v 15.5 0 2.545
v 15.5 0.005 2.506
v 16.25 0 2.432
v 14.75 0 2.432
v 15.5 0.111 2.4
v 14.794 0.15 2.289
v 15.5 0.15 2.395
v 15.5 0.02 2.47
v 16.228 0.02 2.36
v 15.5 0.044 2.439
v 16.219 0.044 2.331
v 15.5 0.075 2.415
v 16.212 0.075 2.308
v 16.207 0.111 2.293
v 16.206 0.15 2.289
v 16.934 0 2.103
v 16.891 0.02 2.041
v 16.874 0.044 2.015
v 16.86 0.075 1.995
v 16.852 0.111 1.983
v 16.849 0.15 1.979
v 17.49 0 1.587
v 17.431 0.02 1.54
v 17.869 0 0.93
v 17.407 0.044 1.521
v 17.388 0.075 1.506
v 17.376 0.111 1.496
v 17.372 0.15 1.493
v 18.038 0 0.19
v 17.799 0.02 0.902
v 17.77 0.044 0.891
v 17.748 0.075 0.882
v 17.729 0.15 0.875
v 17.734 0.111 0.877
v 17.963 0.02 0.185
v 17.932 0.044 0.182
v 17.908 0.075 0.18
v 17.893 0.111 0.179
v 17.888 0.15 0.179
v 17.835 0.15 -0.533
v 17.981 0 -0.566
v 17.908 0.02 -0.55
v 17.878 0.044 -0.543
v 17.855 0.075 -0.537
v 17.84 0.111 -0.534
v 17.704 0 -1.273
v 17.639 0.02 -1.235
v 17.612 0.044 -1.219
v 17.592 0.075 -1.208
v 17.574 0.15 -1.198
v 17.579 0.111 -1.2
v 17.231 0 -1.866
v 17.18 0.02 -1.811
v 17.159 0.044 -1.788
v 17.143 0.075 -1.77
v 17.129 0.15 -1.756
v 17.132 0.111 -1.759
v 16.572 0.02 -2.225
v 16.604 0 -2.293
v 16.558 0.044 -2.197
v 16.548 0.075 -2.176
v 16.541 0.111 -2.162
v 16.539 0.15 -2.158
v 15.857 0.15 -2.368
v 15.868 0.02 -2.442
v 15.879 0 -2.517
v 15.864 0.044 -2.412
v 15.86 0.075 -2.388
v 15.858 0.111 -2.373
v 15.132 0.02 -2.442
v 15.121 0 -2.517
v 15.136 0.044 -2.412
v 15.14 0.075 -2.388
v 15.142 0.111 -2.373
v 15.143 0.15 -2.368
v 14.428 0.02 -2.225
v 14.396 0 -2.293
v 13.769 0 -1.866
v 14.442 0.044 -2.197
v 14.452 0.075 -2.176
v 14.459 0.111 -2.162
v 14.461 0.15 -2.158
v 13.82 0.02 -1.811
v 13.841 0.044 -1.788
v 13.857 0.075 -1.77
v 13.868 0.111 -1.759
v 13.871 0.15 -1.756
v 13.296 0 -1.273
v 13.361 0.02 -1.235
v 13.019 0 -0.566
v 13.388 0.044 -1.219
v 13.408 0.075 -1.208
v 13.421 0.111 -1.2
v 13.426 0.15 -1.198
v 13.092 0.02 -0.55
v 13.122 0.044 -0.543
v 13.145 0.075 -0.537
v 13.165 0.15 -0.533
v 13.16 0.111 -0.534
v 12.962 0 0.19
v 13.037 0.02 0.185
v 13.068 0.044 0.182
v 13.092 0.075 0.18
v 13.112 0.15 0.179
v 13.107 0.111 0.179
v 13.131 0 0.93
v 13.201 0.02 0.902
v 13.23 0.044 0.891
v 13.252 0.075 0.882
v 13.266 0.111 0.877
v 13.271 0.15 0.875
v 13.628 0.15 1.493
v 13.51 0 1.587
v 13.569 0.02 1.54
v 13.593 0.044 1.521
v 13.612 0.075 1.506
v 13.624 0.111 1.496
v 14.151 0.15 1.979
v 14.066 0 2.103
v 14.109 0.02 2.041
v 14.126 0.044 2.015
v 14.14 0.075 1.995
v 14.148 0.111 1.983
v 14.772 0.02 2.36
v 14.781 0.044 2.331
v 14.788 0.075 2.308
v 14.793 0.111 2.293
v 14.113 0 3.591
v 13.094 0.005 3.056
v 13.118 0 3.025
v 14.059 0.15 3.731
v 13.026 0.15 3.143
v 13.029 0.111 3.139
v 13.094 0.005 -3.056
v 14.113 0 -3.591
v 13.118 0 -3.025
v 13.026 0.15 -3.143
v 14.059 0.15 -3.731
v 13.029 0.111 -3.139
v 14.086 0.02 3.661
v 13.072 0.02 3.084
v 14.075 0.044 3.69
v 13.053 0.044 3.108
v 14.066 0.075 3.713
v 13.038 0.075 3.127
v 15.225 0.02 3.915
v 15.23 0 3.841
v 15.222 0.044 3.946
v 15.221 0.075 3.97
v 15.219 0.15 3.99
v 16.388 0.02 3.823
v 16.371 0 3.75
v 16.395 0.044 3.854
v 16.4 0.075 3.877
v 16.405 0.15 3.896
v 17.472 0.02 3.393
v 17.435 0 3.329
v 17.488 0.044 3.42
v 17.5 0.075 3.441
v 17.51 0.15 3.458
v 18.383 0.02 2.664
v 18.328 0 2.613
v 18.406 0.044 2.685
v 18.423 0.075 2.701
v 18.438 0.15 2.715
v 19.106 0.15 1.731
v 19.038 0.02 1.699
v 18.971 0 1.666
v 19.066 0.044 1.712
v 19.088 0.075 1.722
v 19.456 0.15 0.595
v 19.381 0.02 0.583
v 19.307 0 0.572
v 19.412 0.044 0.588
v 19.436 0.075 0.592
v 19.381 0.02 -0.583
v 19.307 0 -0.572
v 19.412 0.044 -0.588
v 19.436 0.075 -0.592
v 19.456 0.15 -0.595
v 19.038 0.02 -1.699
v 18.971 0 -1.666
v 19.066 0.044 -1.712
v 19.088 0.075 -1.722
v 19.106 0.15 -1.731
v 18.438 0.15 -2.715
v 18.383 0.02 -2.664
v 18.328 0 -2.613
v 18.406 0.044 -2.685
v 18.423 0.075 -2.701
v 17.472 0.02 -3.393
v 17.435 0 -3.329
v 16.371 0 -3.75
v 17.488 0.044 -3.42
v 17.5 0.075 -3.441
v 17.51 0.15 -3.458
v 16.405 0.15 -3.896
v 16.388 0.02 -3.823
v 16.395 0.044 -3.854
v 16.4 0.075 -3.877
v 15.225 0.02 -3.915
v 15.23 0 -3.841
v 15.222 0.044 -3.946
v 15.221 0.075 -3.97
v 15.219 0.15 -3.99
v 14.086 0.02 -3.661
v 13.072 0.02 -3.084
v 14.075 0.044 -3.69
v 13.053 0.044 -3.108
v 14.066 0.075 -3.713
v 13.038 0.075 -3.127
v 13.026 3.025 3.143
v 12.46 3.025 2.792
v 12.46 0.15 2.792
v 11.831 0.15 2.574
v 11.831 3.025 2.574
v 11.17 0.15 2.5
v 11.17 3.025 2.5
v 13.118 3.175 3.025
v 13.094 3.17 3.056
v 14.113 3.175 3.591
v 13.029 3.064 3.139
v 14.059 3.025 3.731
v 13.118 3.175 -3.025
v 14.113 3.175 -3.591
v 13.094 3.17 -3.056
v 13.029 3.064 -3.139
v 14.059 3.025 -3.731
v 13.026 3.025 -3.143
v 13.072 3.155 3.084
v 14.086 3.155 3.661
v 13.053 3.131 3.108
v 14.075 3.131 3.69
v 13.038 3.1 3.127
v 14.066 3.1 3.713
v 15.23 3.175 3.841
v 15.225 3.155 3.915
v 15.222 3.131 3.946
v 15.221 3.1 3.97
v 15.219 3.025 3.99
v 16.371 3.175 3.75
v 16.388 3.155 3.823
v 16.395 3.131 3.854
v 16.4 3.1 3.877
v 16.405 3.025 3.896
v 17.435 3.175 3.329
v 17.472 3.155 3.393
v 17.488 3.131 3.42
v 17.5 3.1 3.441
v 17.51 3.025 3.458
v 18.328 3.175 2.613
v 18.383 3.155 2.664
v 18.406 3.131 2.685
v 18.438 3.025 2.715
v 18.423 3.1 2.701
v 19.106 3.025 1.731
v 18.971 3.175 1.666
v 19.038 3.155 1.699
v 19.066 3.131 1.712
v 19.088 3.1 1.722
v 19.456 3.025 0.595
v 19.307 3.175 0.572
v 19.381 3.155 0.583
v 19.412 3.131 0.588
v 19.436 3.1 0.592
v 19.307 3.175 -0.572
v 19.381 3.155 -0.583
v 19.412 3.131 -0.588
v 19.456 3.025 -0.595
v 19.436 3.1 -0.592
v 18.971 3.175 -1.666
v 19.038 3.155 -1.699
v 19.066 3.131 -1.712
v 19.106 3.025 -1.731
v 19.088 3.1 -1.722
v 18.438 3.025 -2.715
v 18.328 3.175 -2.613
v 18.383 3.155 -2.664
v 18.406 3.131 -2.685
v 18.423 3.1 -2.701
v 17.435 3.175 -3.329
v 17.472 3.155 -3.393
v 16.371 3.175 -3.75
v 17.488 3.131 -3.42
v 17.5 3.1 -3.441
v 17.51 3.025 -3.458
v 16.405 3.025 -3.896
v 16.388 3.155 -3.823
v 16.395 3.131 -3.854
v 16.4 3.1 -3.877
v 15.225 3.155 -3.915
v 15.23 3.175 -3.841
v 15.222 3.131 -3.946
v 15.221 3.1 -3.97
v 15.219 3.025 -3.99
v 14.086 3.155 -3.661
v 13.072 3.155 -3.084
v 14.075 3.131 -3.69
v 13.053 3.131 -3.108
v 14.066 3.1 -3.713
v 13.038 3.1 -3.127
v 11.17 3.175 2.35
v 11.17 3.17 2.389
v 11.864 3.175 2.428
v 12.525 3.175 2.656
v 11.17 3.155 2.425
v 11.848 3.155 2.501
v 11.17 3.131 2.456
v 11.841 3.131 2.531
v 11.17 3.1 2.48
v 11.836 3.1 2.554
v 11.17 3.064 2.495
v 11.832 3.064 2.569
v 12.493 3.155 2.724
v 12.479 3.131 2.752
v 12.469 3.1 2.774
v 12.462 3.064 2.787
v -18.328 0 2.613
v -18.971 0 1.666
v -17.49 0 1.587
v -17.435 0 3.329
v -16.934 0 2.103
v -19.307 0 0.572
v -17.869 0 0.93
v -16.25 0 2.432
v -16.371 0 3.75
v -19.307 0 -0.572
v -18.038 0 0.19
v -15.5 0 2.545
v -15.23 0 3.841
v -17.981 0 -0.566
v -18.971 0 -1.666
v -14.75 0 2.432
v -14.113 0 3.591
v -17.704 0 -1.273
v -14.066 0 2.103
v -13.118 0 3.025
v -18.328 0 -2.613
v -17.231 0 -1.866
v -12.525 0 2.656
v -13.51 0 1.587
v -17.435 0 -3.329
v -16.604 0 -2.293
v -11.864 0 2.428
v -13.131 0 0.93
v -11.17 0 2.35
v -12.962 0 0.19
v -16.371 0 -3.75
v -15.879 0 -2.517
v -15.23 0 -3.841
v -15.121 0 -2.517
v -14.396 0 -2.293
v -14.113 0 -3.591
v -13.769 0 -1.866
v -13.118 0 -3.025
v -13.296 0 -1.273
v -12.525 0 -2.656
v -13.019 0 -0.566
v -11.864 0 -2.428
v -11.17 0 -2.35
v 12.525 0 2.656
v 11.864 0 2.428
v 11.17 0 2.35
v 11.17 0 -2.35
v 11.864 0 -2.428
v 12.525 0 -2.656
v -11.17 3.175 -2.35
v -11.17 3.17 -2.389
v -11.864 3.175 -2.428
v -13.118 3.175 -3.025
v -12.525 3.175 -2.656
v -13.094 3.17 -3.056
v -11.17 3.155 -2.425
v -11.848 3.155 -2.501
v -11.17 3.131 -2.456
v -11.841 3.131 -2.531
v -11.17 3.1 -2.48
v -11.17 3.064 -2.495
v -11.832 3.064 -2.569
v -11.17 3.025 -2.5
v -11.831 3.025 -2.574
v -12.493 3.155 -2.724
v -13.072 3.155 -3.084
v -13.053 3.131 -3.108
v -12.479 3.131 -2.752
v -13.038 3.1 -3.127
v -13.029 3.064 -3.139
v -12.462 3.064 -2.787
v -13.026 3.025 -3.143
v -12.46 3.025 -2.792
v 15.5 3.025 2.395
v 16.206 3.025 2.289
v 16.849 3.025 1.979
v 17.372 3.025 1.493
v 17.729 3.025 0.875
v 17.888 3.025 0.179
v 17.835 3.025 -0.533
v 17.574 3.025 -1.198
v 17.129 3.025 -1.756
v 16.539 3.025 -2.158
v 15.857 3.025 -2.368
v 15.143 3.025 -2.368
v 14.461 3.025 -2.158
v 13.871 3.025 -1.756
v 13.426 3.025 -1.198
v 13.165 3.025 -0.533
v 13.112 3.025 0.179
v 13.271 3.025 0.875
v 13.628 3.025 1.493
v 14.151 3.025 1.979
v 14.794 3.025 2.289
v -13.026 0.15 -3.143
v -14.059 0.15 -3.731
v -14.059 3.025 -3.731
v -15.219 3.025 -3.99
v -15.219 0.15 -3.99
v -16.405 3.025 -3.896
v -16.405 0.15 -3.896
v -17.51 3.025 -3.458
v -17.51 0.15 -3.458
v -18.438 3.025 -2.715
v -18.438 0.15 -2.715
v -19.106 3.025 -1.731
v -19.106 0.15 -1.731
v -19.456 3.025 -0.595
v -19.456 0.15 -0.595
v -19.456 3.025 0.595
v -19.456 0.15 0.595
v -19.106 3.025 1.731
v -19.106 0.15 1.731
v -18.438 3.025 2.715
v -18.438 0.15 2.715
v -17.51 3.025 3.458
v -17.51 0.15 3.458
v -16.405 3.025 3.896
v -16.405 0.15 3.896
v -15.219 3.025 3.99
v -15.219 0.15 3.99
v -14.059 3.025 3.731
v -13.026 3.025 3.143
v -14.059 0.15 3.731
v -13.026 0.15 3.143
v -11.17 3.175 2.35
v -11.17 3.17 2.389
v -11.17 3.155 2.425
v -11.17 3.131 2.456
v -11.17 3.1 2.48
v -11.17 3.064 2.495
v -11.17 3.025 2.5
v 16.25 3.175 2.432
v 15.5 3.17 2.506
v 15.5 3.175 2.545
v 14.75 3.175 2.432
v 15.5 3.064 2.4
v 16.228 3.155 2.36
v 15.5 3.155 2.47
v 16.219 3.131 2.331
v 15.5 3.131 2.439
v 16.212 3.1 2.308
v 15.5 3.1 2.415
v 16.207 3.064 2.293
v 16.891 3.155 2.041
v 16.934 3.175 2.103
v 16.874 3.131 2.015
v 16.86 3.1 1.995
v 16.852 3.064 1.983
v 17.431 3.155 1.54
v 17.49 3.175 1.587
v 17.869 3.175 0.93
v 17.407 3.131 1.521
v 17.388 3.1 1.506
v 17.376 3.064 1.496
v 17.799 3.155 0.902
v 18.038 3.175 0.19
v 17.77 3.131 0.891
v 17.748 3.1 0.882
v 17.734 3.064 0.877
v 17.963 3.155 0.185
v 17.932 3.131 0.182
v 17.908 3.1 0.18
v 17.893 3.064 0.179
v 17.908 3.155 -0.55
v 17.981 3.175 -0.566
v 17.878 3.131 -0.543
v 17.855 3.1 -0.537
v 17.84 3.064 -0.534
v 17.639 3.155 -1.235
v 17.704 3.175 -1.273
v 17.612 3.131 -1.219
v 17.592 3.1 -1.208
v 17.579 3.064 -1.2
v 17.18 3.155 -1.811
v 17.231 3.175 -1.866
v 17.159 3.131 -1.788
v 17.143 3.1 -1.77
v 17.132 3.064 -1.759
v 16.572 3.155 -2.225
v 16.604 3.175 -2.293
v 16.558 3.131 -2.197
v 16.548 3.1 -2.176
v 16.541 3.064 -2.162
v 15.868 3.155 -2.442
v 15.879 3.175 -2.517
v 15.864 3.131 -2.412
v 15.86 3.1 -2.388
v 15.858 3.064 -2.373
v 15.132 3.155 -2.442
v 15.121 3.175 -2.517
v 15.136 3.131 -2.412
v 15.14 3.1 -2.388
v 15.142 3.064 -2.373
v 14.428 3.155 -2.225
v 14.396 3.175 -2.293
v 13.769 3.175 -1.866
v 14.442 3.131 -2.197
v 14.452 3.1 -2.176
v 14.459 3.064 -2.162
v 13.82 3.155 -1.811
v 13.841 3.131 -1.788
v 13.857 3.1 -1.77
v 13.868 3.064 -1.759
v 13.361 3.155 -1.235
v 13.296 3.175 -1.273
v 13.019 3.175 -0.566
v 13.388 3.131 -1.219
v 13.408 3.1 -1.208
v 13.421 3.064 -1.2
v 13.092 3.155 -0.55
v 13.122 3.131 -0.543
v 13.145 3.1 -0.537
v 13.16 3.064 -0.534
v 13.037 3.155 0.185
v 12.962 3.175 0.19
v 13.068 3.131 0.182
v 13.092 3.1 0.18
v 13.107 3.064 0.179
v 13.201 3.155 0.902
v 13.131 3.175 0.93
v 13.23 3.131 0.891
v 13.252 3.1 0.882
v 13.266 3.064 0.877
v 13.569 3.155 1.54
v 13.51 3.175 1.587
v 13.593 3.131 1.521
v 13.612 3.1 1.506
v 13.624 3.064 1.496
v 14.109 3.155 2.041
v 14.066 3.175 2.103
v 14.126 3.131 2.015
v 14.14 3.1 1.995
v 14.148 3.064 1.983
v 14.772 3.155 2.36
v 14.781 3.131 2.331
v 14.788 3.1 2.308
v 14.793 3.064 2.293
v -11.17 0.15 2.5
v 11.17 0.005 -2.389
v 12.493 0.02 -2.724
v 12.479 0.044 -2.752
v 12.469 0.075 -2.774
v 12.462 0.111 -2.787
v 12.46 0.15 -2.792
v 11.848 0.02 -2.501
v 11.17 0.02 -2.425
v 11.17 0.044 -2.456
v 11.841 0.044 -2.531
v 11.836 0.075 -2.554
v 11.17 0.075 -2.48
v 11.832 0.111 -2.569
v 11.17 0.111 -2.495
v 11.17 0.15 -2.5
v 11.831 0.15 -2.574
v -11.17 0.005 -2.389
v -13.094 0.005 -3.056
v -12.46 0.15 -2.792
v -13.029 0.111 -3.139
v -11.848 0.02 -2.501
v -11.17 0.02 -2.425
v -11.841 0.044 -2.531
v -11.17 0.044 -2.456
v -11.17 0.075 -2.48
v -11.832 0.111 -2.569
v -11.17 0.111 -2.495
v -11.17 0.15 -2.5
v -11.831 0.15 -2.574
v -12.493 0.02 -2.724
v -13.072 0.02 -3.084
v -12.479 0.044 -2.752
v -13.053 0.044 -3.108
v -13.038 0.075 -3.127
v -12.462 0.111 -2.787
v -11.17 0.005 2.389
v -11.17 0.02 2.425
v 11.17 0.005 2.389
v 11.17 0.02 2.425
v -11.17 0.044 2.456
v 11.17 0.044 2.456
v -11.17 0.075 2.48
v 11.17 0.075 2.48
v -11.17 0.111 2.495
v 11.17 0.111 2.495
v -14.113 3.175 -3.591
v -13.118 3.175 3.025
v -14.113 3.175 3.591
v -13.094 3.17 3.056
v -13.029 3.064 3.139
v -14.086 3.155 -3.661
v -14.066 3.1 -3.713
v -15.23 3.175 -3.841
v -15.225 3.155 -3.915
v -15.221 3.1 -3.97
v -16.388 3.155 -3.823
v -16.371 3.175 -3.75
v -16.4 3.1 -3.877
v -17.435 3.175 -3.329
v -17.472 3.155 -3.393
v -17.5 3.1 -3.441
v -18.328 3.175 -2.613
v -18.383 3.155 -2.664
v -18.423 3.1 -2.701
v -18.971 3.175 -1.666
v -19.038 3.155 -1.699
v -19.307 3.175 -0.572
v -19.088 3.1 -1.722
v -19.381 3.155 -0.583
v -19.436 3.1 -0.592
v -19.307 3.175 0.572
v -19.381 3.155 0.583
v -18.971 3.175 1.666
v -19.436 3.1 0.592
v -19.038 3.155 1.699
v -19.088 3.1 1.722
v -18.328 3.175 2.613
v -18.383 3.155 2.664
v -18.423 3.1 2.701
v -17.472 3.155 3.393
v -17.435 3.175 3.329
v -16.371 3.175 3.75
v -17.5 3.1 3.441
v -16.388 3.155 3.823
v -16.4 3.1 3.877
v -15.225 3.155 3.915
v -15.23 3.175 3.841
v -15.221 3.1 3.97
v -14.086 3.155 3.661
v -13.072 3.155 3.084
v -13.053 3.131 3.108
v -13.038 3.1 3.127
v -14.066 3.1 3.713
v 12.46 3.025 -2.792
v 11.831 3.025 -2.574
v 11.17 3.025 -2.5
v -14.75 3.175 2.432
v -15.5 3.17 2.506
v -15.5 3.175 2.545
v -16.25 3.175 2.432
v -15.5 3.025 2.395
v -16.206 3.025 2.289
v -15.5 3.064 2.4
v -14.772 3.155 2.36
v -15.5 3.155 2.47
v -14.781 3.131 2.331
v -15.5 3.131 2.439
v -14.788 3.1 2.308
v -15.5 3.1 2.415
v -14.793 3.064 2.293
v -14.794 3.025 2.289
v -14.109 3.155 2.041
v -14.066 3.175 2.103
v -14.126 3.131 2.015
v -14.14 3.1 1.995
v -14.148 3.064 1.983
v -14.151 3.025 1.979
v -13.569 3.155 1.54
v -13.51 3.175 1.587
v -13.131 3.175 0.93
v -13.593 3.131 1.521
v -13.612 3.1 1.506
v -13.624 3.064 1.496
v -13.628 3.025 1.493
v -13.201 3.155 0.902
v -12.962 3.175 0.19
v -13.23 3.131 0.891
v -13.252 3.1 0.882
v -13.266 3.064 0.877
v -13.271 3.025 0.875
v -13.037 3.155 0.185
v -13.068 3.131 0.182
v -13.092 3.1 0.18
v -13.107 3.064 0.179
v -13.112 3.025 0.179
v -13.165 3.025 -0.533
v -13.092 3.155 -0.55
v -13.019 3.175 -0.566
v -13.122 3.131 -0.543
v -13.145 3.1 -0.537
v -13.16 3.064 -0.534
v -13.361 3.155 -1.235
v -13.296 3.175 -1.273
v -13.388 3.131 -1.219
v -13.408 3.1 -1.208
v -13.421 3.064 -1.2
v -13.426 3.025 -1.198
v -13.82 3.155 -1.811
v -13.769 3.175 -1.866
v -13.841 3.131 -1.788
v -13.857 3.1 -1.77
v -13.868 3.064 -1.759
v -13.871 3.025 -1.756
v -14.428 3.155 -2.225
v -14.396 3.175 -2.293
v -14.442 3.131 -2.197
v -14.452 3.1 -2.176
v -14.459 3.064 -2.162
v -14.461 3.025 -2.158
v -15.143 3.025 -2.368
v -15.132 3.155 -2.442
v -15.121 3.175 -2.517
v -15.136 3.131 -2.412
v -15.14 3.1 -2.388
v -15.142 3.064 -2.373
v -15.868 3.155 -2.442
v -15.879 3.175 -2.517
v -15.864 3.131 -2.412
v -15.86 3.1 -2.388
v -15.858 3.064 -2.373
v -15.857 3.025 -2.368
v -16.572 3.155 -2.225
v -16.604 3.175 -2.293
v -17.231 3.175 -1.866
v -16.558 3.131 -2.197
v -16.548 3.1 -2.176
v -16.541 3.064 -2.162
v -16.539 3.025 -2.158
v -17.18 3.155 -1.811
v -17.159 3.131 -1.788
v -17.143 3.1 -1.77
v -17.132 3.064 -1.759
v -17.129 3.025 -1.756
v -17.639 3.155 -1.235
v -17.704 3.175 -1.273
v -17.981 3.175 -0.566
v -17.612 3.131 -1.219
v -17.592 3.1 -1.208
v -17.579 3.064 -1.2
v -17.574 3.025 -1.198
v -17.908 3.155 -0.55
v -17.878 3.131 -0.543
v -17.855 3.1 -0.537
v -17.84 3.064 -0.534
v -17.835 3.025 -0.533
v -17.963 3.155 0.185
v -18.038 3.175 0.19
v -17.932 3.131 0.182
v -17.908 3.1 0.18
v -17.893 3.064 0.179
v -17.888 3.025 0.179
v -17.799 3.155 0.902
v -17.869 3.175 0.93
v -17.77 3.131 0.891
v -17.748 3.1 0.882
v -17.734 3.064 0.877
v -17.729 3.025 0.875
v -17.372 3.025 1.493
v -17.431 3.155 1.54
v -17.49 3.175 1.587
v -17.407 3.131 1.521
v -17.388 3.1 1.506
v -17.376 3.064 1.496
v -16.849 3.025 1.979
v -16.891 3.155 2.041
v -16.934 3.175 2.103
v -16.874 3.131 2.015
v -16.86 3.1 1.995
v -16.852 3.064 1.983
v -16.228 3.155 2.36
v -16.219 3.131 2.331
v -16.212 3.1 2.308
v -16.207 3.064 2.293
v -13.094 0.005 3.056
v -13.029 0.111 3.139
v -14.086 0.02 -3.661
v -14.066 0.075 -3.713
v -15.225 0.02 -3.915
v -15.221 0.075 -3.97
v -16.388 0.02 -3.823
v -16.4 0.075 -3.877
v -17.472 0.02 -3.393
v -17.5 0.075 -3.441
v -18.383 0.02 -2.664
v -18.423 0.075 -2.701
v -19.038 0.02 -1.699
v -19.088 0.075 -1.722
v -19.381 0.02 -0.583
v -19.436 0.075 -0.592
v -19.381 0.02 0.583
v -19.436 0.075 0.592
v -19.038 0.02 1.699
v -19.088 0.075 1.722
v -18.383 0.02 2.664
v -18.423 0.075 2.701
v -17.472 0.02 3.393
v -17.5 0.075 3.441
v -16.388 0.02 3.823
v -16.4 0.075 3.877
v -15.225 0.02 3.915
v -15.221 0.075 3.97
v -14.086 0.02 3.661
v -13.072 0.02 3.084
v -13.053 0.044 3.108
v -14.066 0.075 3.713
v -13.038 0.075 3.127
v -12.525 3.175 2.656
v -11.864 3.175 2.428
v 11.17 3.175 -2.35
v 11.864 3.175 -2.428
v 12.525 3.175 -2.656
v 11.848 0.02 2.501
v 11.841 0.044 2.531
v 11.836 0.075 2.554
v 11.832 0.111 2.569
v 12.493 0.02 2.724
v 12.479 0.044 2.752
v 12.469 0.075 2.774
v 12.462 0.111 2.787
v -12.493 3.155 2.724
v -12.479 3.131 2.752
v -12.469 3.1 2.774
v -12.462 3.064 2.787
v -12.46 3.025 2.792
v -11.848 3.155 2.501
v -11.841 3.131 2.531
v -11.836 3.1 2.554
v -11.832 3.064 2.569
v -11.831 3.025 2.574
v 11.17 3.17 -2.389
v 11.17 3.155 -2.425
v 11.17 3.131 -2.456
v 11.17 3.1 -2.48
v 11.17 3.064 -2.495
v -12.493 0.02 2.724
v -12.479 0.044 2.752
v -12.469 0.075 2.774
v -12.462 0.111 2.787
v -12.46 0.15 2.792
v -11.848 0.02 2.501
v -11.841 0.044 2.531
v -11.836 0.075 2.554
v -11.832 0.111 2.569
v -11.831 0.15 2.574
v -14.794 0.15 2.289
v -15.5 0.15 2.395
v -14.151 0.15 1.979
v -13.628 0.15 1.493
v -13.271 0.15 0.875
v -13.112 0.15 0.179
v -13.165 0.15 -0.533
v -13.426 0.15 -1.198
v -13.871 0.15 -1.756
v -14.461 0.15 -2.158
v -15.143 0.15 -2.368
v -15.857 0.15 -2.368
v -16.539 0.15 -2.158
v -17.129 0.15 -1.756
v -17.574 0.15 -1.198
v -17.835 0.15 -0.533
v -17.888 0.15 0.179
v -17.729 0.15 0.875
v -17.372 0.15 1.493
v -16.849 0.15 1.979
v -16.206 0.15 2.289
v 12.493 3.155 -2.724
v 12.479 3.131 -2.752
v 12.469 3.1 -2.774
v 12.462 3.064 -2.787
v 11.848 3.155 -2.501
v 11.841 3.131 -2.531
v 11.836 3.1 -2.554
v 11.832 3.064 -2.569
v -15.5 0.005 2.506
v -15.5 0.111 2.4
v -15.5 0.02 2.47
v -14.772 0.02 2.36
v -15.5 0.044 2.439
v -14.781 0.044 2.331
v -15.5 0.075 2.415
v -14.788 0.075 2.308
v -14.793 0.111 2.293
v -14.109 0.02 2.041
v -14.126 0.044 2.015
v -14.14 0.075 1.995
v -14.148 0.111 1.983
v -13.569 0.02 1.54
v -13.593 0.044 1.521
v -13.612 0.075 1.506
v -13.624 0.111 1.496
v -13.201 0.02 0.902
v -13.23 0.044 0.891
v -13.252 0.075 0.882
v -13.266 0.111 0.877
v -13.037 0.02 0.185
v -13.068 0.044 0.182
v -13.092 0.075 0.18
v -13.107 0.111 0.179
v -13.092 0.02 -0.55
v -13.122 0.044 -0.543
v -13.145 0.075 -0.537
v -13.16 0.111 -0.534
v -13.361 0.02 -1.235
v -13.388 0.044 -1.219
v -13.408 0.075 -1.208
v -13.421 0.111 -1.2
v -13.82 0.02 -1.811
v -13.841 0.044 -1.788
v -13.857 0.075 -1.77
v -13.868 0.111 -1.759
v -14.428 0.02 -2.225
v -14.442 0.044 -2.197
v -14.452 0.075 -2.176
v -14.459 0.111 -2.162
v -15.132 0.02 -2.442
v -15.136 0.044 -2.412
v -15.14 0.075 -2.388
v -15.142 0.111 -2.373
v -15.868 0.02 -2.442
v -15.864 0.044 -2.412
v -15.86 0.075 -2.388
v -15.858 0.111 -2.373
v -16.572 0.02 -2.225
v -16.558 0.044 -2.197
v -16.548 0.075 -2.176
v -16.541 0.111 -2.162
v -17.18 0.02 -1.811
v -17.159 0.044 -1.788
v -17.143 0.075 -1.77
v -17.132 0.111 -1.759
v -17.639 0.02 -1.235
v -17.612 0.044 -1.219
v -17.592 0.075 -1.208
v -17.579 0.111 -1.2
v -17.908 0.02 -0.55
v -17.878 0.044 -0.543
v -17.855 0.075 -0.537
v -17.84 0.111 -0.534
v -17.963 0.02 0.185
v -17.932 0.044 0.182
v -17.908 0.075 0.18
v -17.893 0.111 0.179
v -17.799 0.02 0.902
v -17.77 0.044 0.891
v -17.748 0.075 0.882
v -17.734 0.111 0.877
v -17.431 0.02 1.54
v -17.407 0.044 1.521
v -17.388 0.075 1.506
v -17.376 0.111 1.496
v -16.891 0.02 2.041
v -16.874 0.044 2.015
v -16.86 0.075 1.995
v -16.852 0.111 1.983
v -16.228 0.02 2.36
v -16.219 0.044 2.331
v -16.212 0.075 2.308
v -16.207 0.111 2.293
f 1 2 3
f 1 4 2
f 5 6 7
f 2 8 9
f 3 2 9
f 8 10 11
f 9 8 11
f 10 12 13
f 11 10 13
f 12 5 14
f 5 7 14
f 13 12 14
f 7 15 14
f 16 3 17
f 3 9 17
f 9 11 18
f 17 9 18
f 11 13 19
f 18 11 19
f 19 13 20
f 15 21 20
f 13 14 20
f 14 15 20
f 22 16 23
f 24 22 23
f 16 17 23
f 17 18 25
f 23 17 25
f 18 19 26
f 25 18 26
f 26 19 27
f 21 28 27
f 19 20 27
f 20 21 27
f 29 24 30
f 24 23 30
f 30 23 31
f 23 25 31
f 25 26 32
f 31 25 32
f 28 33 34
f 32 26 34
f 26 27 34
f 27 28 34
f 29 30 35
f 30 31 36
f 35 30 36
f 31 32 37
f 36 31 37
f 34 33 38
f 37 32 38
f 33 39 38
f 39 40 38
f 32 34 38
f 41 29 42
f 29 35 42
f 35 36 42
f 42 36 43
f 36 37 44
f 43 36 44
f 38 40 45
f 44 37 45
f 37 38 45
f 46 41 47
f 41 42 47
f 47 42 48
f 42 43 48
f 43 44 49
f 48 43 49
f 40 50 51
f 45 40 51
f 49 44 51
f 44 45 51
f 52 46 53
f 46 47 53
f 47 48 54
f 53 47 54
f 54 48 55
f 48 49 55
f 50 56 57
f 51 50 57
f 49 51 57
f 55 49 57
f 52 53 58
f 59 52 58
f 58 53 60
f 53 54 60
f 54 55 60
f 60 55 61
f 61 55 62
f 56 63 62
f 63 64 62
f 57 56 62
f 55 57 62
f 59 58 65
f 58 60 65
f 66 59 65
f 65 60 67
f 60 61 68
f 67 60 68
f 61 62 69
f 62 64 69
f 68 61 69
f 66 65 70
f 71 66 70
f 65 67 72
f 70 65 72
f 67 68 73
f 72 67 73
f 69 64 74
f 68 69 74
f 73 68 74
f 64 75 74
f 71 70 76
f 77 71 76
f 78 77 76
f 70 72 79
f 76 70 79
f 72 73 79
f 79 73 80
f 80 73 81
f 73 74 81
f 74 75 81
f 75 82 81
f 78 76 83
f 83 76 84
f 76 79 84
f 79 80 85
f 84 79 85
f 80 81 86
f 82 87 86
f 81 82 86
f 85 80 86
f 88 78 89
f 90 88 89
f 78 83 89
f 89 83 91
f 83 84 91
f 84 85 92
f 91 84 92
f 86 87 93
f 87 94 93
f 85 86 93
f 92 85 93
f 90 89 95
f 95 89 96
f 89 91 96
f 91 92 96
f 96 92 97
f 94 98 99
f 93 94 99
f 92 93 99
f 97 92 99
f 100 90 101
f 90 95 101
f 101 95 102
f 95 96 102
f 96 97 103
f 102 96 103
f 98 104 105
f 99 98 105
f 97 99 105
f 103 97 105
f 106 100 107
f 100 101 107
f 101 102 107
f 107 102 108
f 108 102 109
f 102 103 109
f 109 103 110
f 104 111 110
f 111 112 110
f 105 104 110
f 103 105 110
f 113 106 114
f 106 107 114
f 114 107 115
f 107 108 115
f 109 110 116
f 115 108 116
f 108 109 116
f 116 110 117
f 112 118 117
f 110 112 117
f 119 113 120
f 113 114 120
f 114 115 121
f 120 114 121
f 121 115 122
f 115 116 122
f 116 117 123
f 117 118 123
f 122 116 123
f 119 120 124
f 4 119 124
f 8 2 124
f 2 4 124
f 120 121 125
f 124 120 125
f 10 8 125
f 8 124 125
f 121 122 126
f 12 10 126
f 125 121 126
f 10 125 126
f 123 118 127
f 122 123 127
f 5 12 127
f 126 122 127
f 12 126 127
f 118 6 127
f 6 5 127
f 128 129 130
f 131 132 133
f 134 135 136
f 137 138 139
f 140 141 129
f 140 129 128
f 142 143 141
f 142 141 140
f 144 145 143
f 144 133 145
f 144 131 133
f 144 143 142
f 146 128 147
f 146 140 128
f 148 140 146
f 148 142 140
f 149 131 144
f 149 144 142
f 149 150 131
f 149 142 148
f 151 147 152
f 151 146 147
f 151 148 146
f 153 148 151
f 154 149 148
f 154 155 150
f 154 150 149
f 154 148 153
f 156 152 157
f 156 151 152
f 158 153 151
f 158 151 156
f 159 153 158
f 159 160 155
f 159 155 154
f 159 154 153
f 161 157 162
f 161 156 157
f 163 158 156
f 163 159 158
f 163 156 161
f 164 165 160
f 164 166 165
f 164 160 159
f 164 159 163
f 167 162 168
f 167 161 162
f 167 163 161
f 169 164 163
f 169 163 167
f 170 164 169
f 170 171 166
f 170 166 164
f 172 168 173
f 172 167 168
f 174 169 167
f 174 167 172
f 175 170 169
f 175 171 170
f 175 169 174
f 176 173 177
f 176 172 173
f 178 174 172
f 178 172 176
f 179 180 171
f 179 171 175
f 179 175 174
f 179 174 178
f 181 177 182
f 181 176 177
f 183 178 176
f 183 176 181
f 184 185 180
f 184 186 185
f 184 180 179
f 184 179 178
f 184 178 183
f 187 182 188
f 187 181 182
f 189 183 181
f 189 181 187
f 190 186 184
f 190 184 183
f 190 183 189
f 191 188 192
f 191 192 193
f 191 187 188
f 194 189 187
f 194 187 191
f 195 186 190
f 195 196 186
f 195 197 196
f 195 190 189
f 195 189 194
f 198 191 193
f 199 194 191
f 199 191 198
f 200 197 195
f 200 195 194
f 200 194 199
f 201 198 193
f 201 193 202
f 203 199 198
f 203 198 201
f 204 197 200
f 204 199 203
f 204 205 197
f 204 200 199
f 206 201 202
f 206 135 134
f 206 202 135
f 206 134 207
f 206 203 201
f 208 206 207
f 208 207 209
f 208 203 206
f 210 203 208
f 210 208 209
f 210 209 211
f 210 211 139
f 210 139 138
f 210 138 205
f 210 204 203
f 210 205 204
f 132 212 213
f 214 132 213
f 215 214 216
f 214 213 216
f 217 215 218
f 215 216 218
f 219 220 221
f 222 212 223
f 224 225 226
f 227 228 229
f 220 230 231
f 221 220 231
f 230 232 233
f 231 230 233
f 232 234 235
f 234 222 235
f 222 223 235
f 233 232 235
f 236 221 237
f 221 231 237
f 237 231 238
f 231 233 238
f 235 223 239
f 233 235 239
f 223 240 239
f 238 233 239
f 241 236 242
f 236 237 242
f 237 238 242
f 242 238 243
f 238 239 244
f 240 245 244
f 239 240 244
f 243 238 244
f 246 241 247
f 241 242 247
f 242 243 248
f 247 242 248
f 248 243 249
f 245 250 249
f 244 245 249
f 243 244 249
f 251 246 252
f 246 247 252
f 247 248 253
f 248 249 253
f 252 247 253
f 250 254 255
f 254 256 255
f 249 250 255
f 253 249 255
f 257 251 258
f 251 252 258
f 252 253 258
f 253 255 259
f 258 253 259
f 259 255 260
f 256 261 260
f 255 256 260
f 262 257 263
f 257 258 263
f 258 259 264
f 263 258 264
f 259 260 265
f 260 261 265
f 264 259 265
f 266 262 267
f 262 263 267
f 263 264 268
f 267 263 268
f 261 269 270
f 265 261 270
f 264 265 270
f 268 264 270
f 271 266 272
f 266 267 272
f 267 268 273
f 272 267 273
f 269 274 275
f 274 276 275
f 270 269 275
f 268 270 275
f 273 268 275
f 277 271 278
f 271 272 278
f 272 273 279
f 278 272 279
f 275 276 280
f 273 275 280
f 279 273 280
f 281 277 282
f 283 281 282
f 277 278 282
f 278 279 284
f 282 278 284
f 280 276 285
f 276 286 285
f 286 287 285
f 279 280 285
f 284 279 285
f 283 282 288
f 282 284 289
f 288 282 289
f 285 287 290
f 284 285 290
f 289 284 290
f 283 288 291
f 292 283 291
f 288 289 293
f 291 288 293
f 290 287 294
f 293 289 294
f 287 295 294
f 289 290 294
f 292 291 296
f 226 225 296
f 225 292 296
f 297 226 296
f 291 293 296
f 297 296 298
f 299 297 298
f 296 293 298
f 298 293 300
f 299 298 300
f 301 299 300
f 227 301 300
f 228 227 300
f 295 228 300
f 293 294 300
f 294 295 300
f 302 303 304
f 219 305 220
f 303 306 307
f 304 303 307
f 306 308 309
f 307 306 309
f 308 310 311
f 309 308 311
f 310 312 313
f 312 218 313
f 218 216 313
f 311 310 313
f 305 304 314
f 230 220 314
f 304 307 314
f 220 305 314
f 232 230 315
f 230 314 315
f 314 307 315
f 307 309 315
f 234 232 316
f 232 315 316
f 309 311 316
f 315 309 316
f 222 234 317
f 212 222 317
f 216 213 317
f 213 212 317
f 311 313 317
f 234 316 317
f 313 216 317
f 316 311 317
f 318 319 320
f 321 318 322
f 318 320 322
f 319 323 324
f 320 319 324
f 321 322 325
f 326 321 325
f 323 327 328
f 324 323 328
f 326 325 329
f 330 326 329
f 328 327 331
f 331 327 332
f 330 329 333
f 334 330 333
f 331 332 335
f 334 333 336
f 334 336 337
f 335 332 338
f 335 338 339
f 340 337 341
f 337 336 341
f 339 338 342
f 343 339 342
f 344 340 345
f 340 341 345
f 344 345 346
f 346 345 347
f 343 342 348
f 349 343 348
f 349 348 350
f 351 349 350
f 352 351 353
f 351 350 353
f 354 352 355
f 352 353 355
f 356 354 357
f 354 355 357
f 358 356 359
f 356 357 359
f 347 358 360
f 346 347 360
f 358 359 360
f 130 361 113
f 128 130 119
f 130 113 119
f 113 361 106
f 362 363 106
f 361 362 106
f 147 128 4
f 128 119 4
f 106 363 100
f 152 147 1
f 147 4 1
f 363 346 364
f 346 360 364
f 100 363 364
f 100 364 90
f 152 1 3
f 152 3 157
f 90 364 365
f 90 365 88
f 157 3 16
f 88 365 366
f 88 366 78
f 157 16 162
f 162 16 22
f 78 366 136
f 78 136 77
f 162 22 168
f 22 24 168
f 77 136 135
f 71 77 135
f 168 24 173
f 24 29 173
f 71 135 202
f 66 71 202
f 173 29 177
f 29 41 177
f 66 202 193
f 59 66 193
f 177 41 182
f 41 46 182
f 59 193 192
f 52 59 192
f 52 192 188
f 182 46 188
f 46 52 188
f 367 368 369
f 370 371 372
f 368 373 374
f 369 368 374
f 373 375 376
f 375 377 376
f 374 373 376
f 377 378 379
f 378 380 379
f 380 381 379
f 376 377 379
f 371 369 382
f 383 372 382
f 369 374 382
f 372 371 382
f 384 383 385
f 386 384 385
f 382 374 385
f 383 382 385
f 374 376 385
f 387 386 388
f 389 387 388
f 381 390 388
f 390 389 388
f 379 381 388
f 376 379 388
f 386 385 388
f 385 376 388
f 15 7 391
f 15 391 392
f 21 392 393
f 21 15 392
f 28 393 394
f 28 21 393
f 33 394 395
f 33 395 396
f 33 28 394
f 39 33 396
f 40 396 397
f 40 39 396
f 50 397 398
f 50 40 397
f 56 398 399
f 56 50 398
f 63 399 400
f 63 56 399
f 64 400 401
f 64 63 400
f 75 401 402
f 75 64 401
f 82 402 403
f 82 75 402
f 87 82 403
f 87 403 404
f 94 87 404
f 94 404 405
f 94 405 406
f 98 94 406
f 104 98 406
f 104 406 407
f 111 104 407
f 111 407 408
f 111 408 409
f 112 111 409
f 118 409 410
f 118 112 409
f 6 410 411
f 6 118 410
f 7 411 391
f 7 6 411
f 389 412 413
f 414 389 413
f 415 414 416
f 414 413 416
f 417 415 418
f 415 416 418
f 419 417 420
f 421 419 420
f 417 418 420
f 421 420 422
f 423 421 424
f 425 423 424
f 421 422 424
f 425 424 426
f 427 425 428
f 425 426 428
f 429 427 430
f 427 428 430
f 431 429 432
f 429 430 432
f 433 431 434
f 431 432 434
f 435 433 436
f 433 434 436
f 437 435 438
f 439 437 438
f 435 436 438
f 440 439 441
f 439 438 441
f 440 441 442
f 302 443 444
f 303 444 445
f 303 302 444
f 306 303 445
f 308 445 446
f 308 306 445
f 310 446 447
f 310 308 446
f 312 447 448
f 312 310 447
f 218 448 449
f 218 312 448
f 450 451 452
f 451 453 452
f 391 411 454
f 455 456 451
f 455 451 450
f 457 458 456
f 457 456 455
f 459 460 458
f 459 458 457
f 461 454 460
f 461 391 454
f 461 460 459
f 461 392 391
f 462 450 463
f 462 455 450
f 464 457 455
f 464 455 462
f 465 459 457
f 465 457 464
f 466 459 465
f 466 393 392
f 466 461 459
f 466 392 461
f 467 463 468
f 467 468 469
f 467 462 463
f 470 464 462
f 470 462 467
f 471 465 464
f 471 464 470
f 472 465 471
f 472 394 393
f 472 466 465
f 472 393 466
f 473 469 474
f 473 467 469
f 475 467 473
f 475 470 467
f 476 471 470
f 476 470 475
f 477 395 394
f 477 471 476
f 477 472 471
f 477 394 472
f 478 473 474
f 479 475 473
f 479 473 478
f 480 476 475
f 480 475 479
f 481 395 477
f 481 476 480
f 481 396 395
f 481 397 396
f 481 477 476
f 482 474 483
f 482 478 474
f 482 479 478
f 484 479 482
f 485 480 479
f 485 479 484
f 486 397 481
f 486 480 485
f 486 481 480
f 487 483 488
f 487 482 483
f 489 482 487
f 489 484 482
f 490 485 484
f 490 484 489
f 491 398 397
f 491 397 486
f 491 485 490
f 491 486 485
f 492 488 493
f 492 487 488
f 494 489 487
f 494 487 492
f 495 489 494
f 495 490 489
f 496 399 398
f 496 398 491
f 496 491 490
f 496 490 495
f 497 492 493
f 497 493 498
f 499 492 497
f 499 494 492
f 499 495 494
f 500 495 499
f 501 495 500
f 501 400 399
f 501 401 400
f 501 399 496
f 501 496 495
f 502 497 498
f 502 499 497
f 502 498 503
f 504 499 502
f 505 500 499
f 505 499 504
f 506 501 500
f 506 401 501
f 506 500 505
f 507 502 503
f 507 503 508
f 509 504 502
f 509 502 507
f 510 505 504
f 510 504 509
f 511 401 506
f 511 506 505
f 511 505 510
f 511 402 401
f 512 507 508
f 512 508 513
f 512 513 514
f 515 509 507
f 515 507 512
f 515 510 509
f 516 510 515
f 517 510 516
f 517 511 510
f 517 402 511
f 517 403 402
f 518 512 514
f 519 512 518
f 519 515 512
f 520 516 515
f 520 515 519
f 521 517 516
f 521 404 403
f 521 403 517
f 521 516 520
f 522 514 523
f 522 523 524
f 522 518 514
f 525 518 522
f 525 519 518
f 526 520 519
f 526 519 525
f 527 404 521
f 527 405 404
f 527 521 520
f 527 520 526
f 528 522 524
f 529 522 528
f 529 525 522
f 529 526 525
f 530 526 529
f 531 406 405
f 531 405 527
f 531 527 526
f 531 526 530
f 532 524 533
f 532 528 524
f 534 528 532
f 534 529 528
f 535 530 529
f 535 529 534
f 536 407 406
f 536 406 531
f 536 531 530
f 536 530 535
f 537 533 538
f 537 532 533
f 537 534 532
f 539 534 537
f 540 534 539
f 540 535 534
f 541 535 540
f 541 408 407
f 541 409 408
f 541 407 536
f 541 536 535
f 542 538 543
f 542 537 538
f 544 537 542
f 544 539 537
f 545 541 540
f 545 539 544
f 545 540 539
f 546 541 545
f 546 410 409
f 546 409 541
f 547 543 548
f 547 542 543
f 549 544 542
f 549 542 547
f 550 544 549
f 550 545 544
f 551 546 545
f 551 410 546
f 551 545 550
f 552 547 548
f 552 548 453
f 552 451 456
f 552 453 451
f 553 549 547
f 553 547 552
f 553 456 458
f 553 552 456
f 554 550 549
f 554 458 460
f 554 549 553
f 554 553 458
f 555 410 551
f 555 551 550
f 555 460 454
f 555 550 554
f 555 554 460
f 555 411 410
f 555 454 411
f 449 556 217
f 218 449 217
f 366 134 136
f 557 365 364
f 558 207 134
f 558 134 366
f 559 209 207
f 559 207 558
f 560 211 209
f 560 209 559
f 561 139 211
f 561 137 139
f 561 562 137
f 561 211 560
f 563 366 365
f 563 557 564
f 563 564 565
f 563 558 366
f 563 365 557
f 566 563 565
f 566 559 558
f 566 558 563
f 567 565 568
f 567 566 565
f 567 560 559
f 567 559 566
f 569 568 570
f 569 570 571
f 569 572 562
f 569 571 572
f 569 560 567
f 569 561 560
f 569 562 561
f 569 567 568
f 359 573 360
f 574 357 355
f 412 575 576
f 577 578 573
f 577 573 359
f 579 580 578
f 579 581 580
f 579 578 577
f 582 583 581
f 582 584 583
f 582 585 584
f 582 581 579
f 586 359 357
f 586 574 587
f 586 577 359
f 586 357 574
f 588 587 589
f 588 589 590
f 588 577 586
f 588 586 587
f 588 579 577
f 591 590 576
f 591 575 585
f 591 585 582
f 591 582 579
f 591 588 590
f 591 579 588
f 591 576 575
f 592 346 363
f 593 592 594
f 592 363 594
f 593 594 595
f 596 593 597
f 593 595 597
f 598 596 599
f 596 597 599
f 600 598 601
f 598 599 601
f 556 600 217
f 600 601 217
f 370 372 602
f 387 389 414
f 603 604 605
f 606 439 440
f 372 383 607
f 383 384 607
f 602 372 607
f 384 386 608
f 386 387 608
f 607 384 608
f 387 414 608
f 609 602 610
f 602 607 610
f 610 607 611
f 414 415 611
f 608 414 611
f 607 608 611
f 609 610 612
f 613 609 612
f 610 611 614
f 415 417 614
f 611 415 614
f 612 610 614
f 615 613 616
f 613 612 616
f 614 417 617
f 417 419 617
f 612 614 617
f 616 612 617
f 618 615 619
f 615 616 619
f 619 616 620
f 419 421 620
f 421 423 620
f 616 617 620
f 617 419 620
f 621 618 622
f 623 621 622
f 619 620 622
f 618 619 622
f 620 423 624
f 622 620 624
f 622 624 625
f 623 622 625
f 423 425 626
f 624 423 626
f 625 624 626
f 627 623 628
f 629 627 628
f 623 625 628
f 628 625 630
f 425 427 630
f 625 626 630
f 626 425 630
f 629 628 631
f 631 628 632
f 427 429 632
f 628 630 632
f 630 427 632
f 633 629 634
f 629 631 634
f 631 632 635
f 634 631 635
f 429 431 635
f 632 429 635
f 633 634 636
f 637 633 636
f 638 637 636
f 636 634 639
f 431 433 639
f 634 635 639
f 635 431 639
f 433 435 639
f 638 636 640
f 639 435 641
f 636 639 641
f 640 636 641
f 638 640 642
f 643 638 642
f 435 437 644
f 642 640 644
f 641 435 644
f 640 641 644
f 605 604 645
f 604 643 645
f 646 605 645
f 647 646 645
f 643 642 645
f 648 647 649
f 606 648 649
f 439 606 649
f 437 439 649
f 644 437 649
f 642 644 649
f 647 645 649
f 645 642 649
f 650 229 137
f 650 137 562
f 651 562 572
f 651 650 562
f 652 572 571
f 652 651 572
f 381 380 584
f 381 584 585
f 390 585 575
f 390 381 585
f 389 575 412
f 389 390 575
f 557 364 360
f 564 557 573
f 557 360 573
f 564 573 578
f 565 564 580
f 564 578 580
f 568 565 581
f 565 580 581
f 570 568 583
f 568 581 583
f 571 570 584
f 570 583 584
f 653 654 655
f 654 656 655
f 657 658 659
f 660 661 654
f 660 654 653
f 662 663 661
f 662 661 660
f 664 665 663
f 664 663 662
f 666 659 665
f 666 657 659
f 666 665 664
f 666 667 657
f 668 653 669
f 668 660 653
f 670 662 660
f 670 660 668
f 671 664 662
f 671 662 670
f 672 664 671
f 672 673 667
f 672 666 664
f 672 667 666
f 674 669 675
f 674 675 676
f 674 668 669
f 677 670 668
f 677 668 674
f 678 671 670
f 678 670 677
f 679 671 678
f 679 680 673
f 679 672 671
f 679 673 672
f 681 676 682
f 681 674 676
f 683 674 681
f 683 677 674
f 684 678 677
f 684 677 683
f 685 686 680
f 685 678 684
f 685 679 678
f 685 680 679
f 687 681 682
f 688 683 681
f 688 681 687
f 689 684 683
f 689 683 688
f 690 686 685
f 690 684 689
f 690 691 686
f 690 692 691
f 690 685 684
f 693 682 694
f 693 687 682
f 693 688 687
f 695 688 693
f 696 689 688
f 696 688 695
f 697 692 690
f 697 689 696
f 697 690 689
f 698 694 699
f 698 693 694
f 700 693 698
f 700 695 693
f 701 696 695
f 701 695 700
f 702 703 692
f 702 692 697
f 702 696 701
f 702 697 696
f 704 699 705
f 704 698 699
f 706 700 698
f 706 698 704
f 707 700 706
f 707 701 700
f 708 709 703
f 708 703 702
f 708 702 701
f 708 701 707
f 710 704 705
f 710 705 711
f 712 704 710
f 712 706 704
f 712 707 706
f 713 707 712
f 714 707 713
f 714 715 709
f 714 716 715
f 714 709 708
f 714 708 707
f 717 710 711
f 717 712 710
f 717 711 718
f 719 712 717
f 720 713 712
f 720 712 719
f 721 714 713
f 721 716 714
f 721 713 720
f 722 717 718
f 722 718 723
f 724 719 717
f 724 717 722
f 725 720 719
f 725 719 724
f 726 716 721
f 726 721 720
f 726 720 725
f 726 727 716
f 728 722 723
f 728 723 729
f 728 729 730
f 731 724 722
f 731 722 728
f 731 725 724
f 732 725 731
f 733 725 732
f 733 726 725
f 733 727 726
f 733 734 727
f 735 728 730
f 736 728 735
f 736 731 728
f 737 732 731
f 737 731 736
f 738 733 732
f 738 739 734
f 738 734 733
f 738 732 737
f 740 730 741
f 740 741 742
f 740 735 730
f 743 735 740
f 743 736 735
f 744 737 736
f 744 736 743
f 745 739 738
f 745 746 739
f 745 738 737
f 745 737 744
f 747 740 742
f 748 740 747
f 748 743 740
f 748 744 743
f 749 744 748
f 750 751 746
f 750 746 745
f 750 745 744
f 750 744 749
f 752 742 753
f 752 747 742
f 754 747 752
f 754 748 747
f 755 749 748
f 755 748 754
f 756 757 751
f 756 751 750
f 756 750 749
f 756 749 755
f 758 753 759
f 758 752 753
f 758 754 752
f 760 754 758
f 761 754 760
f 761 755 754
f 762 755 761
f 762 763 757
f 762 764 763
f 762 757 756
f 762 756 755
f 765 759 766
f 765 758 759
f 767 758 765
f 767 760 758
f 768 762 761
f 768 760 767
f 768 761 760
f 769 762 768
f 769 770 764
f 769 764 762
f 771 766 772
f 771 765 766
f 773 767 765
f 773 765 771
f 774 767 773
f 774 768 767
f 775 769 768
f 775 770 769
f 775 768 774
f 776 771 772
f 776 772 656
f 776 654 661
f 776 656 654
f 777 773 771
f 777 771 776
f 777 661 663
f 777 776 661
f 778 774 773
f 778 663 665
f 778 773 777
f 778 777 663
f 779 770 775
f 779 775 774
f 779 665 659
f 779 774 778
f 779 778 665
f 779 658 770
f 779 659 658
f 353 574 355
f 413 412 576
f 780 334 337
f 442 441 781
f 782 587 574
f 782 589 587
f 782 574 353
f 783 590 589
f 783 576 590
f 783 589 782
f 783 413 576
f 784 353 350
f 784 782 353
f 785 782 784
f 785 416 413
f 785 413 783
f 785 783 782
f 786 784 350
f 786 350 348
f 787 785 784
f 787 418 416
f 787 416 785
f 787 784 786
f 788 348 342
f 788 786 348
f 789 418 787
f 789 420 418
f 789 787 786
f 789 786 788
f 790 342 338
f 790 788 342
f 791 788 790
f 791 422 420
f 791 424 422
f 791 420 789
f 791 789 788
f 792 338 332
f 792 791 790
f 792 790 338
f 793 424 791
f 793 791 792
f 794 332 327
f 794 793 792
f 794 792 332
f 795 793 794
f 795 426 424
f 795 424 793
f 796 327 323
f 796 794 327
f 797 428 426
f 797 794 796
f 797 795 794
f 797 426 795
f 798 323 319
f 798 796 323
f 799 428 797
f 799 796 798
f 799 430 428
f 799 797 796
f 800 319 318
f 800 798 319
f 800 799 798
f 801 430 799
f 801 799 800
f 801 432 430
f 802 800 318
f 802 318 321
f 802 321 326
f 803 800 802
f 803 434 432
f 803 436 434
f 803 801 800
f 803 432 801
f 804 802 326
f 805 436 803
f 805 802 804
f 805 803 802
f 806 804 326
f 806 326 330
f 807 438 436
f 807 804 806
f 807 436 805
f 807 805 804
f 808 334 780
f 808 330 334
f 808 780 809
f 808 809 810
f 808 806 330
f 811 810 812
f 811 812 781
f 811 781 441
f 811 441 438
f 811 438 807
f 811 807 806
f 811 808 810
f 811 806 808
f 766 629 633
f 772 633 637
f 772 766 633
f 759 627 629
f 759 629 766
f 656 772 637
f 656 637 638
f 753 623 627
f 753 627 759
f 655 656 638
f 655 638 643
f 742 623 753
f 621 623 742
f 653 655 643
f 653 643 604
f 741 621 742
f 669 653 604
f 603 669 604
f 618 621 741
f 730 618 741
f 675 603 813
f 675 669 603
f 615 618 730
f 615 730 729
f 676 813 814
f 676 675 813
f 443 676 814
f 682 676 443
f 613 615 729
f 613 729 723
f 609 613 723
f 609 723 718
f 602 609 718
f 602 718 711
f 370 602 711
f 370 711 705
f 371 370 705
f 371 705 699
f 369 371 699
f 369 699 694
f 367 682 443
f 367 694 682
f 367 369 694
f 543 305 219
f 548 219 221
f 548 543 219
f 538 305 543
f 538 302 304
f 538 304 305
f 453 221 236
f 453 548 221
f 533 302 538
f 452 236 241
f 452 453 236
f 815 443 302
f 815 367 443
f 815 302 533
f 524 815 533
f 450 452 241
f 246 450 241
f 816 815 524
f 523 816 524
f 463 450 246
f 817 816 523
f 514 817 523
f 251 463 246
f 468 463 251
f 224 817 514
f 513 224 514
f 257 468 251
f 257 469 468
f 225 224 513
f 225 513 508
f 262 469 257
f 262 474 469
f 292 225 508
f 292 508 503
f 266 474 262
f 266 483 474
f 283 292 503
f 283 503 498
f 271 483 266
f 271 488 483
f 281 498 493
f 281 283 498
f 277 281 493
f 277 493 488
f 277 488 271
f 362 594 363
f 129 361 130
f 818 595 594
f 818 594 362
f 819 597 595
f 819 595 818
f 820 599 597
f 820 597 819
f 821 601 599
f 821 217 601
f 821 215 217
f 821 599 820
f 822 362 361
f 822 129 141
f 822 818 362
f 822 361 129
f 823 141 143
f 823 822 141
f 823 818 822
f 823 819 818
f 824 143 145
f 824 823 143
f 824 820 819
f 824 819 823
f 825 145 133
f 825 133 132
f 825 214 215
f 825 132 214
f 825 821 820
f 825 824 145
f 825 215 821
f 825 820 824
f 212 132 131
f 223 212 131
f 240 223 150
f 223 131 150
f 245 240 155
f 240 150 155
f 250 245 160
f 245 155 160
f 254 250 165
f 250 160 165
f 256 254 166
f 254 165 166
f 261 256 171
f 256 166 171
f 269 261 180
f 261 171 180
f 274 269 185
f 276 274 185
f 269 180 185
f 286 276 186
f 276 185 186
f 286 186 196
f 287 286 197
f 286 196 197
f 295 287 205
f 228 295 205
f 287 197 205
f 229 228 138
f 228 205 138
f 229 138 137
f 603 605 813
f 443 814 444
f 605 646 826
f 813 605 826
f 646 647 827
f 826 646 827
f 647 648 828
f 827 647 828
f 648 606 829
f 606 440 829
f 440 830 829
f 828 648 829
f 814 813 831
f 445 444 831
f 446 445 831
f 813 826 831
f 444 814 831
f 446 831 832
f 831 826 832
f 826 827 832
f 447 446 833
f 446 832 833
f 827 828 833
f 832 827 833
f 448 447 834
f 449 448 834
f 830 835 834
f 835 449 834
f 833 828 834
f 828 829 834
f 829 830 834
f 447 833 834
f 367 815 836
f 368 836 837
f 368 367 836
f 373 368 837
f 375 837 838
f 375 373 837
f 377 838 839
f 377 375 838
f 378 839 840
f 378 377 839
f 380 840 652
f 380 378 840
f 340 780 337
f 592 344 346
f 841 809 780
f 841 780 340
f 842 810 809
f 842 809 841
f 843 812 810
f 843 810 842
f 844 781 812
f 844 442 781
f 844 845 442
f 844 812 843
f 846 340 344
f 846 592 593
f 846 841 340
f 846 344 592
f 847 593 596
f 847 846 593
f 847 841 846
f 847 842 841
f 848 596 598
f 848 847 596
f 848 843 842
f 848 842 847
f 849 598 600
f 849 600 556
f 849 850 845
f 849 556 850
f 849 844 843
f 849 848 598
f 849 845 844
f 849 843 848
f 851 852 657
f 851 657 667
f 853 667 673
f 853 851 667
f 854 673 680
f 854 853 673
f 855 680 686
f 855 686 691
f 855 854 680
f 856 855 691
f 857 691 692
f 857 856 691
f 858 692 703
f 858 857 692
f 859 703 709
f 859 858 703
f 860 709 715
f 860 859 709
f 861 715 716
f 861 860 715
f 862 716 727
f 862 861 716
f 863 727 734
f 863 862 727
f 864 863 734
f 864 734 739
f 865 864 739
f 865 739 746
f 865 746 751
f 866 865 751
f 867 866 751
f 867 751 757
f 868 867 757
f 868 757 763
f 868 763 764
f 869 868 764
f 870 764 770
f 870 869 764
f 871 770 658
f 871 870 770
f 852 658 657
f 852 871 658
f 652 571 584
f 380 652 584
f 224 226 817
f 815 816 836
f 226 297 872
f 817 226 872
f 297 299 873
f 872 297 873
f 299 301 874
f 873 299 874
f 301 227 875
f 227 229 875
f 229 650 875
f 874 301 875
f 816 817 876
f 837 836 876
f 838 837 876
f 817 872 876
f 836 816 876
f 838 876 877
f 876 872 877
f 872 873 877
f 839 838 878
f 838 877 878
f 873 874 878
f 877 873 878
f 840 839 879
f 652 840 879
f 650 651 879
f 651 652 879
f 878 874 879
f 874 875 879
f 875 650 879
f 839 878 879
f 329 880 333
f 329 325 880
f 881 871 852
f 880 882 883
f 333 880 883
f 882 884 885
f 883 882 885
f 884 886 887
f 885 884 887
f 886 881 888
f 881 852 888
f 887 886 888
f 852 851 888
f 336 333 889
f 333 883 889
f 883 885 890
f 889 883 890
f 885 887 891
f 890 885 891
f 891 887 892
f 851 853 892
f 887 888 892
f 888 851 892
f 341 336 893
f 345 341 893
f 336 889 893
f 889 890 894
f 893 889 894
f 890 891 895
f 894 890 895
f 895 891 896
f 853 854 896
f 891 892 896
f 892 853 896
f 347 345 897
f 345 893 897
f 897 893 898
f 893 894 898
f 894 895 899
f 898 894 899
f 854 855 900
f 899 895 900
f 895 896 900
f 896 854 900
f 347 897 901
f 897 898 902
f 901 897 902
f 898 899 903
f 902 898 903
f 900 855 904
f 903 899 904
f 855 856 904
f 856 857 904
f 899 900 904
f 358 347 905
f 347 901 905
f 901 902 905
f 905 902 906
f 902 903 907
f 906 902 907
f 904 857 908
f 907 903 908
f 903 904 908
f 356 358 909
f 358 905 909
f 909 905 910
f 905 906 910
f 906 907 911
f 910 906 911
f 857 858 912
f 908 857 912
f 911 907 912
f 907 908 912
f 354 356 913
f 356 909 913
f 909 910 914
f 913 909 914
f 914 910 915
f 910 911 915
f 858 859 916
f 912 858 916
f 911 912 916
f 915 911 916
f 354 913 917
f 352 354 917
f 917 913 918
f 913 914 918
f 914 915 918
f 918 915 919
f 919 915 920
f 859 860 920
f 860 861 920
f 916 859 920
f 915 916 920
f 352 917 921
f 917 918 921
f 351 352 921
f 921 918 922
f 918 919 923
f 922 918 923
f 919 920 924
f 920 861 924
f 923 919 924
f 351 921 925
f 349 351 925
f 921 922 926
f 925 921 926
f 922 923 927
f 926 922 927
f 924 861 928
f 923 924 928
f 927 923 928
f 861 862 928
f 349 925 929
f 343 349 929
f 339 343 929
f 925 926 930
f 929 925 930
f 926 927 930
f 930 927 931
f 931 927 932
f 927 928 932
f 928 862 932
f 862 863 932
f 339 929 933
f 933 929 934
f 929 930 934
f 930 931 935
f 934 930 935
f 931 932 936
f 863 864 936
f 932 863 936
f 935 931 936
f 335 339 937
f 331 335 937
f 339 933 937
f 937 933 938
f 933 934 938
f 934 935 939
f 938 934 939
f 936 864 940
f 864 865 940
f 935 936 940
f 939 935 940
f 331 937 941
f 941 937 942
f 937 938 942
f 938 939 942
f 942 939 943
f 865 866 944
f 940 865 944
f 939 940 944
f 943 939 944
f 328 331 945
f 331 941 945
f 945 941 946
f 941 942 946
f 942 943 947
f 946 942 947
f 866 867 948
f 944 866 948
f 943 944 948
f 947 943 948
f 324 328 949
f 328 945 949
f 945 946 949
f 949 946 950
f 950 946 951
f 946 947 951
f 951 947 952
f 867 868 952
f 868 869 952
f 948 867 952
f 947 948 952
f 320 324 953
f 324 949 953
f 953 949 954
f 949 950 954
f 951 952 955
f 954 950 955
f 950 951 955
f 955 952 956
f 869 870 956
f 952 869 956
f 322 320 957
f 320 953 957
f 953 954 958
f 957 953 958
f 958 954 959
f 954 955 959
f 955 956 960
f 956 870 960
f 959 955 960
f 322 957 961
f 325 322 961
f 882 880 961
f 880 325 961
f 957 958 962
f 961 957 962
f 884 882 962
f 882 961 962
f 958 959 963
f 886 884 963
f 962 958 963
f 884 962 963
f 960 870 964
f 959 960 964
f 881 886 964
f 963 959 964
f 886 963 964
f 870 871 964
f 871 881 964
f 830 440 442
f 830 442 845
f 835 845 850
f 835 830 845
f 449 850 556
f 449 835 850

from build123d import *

# Parameters (mm, degrees)
SKETCH1_R           = 4
SKETCH1_R_2         = 2.395
BOSS_EXTRUDE1_DEPTH = 3.175
FILLET1_R           = 3
FILLET2_R           = 0.15


with BuildPart() as part:
    # Sketch1 → Boss-Extrude1 (new body)
    # profile 1 of 3: a face of its own
    with BuildSketch(Plane(origin=(0, 0, 0), x_dir=(1, 0, 0), z_dir=(0, 1, 0))):
        with Locations((-15.5, 0)):
            Circle(SKETCH1_R)
        with Locations(Location((-15.5, 0, 0), (0, 0, 270))):
            Circle(SKETCH1_R_2, mode=Mode.SUBTRACT)
    # profile 2 of 3: a face of its own
    with BuildSketch(Plane(origin=(0, 0, 0), x_dir=(1, 0, 0), z_dir=(0, 1, 0))):
        with BuildLine():
            Line((12.377501001, 2.5), (-12.377501001, 2.5))
            ThreePointArc((-12.377501001, 2.5), (-11.725745372, 1.324764885), (-11.5, 0))
            ThreePointArc((-11.5, 0), (-11.725745372, -1.324764885), (-12.377501001, -2.5))
            Line((-12.377501001, -2.5), (12.377501001, -2.5))
            ThreePointArc((12.377501001, -2.5), (11.5, 0), (12.377501001, 2.5))
        make_face()
    # profile 3 of 3: a face of its own
    with BuildSketch(Plane(origin=(0, 0, 0), x_dir=(1, 0, 0), z_dir=(0, 1, 0))):
        with Locations((15.5, 0)):
            Circle(SKETCH1_R)
        with Locations(Location((15.5, 0, 0), (0, 0, 270))):
            Circle(SKETCH1_R_2, mode=Mode.SUBTRACT)
    extrude(amount=BOSS_EXTRUDE1_DEPTH)

    # Fillet1
    fillet1_edges = [part.edges().sort_by_distance(p)[0] for p in [
        (-12.377501001, 1.5875, -2.5),
        (12.377501001, 1.5875, -2.5),
        (12.377501001, 1.5875, 2.5),
        (-12.377501001, 1.5875, 2.5),
    ]]
    fillet(fillet1_edges, radius=FILLET1_R)

    # Fillet2
    fillet2_edges = [part.edges().sort_by_distance(p)[0] for p in [
        (-15.5, 0, -2.395),
        (-19.5, 0, 0),
        (-19.5, 3.175, 0),
        (0, 0, -2.5),
        (0, 3.175, -2.5),
        (19.5, 0, 0),
        (19.5, 3.175, 0),
        (0, 0, 2.5),
        (0, 3.175, 2.5),
        (-12.151853487, 0, -2.665266452),
        (15.5, 3.175, -2.395),
        (-12.151853487, 3.175, -2.665266452),
        (12.151853487, 0, -2.665266452),
        (12.151853487, 3.175, -2.665266452),
        (12.151853487, 0, 2.665266452),
        (12.151853487, 3.175, 2.665266452),
        (-12.151853487, 0, 2.665266452),
        (-12.151853487, 3.175, 2.665266452),
        (-15.5, 3.175, -2.395),
        (15.5, 0, -2.395),
    ]]
    fillet(fillet2_edges, radius=FILLET2_R)


solid = part.part
